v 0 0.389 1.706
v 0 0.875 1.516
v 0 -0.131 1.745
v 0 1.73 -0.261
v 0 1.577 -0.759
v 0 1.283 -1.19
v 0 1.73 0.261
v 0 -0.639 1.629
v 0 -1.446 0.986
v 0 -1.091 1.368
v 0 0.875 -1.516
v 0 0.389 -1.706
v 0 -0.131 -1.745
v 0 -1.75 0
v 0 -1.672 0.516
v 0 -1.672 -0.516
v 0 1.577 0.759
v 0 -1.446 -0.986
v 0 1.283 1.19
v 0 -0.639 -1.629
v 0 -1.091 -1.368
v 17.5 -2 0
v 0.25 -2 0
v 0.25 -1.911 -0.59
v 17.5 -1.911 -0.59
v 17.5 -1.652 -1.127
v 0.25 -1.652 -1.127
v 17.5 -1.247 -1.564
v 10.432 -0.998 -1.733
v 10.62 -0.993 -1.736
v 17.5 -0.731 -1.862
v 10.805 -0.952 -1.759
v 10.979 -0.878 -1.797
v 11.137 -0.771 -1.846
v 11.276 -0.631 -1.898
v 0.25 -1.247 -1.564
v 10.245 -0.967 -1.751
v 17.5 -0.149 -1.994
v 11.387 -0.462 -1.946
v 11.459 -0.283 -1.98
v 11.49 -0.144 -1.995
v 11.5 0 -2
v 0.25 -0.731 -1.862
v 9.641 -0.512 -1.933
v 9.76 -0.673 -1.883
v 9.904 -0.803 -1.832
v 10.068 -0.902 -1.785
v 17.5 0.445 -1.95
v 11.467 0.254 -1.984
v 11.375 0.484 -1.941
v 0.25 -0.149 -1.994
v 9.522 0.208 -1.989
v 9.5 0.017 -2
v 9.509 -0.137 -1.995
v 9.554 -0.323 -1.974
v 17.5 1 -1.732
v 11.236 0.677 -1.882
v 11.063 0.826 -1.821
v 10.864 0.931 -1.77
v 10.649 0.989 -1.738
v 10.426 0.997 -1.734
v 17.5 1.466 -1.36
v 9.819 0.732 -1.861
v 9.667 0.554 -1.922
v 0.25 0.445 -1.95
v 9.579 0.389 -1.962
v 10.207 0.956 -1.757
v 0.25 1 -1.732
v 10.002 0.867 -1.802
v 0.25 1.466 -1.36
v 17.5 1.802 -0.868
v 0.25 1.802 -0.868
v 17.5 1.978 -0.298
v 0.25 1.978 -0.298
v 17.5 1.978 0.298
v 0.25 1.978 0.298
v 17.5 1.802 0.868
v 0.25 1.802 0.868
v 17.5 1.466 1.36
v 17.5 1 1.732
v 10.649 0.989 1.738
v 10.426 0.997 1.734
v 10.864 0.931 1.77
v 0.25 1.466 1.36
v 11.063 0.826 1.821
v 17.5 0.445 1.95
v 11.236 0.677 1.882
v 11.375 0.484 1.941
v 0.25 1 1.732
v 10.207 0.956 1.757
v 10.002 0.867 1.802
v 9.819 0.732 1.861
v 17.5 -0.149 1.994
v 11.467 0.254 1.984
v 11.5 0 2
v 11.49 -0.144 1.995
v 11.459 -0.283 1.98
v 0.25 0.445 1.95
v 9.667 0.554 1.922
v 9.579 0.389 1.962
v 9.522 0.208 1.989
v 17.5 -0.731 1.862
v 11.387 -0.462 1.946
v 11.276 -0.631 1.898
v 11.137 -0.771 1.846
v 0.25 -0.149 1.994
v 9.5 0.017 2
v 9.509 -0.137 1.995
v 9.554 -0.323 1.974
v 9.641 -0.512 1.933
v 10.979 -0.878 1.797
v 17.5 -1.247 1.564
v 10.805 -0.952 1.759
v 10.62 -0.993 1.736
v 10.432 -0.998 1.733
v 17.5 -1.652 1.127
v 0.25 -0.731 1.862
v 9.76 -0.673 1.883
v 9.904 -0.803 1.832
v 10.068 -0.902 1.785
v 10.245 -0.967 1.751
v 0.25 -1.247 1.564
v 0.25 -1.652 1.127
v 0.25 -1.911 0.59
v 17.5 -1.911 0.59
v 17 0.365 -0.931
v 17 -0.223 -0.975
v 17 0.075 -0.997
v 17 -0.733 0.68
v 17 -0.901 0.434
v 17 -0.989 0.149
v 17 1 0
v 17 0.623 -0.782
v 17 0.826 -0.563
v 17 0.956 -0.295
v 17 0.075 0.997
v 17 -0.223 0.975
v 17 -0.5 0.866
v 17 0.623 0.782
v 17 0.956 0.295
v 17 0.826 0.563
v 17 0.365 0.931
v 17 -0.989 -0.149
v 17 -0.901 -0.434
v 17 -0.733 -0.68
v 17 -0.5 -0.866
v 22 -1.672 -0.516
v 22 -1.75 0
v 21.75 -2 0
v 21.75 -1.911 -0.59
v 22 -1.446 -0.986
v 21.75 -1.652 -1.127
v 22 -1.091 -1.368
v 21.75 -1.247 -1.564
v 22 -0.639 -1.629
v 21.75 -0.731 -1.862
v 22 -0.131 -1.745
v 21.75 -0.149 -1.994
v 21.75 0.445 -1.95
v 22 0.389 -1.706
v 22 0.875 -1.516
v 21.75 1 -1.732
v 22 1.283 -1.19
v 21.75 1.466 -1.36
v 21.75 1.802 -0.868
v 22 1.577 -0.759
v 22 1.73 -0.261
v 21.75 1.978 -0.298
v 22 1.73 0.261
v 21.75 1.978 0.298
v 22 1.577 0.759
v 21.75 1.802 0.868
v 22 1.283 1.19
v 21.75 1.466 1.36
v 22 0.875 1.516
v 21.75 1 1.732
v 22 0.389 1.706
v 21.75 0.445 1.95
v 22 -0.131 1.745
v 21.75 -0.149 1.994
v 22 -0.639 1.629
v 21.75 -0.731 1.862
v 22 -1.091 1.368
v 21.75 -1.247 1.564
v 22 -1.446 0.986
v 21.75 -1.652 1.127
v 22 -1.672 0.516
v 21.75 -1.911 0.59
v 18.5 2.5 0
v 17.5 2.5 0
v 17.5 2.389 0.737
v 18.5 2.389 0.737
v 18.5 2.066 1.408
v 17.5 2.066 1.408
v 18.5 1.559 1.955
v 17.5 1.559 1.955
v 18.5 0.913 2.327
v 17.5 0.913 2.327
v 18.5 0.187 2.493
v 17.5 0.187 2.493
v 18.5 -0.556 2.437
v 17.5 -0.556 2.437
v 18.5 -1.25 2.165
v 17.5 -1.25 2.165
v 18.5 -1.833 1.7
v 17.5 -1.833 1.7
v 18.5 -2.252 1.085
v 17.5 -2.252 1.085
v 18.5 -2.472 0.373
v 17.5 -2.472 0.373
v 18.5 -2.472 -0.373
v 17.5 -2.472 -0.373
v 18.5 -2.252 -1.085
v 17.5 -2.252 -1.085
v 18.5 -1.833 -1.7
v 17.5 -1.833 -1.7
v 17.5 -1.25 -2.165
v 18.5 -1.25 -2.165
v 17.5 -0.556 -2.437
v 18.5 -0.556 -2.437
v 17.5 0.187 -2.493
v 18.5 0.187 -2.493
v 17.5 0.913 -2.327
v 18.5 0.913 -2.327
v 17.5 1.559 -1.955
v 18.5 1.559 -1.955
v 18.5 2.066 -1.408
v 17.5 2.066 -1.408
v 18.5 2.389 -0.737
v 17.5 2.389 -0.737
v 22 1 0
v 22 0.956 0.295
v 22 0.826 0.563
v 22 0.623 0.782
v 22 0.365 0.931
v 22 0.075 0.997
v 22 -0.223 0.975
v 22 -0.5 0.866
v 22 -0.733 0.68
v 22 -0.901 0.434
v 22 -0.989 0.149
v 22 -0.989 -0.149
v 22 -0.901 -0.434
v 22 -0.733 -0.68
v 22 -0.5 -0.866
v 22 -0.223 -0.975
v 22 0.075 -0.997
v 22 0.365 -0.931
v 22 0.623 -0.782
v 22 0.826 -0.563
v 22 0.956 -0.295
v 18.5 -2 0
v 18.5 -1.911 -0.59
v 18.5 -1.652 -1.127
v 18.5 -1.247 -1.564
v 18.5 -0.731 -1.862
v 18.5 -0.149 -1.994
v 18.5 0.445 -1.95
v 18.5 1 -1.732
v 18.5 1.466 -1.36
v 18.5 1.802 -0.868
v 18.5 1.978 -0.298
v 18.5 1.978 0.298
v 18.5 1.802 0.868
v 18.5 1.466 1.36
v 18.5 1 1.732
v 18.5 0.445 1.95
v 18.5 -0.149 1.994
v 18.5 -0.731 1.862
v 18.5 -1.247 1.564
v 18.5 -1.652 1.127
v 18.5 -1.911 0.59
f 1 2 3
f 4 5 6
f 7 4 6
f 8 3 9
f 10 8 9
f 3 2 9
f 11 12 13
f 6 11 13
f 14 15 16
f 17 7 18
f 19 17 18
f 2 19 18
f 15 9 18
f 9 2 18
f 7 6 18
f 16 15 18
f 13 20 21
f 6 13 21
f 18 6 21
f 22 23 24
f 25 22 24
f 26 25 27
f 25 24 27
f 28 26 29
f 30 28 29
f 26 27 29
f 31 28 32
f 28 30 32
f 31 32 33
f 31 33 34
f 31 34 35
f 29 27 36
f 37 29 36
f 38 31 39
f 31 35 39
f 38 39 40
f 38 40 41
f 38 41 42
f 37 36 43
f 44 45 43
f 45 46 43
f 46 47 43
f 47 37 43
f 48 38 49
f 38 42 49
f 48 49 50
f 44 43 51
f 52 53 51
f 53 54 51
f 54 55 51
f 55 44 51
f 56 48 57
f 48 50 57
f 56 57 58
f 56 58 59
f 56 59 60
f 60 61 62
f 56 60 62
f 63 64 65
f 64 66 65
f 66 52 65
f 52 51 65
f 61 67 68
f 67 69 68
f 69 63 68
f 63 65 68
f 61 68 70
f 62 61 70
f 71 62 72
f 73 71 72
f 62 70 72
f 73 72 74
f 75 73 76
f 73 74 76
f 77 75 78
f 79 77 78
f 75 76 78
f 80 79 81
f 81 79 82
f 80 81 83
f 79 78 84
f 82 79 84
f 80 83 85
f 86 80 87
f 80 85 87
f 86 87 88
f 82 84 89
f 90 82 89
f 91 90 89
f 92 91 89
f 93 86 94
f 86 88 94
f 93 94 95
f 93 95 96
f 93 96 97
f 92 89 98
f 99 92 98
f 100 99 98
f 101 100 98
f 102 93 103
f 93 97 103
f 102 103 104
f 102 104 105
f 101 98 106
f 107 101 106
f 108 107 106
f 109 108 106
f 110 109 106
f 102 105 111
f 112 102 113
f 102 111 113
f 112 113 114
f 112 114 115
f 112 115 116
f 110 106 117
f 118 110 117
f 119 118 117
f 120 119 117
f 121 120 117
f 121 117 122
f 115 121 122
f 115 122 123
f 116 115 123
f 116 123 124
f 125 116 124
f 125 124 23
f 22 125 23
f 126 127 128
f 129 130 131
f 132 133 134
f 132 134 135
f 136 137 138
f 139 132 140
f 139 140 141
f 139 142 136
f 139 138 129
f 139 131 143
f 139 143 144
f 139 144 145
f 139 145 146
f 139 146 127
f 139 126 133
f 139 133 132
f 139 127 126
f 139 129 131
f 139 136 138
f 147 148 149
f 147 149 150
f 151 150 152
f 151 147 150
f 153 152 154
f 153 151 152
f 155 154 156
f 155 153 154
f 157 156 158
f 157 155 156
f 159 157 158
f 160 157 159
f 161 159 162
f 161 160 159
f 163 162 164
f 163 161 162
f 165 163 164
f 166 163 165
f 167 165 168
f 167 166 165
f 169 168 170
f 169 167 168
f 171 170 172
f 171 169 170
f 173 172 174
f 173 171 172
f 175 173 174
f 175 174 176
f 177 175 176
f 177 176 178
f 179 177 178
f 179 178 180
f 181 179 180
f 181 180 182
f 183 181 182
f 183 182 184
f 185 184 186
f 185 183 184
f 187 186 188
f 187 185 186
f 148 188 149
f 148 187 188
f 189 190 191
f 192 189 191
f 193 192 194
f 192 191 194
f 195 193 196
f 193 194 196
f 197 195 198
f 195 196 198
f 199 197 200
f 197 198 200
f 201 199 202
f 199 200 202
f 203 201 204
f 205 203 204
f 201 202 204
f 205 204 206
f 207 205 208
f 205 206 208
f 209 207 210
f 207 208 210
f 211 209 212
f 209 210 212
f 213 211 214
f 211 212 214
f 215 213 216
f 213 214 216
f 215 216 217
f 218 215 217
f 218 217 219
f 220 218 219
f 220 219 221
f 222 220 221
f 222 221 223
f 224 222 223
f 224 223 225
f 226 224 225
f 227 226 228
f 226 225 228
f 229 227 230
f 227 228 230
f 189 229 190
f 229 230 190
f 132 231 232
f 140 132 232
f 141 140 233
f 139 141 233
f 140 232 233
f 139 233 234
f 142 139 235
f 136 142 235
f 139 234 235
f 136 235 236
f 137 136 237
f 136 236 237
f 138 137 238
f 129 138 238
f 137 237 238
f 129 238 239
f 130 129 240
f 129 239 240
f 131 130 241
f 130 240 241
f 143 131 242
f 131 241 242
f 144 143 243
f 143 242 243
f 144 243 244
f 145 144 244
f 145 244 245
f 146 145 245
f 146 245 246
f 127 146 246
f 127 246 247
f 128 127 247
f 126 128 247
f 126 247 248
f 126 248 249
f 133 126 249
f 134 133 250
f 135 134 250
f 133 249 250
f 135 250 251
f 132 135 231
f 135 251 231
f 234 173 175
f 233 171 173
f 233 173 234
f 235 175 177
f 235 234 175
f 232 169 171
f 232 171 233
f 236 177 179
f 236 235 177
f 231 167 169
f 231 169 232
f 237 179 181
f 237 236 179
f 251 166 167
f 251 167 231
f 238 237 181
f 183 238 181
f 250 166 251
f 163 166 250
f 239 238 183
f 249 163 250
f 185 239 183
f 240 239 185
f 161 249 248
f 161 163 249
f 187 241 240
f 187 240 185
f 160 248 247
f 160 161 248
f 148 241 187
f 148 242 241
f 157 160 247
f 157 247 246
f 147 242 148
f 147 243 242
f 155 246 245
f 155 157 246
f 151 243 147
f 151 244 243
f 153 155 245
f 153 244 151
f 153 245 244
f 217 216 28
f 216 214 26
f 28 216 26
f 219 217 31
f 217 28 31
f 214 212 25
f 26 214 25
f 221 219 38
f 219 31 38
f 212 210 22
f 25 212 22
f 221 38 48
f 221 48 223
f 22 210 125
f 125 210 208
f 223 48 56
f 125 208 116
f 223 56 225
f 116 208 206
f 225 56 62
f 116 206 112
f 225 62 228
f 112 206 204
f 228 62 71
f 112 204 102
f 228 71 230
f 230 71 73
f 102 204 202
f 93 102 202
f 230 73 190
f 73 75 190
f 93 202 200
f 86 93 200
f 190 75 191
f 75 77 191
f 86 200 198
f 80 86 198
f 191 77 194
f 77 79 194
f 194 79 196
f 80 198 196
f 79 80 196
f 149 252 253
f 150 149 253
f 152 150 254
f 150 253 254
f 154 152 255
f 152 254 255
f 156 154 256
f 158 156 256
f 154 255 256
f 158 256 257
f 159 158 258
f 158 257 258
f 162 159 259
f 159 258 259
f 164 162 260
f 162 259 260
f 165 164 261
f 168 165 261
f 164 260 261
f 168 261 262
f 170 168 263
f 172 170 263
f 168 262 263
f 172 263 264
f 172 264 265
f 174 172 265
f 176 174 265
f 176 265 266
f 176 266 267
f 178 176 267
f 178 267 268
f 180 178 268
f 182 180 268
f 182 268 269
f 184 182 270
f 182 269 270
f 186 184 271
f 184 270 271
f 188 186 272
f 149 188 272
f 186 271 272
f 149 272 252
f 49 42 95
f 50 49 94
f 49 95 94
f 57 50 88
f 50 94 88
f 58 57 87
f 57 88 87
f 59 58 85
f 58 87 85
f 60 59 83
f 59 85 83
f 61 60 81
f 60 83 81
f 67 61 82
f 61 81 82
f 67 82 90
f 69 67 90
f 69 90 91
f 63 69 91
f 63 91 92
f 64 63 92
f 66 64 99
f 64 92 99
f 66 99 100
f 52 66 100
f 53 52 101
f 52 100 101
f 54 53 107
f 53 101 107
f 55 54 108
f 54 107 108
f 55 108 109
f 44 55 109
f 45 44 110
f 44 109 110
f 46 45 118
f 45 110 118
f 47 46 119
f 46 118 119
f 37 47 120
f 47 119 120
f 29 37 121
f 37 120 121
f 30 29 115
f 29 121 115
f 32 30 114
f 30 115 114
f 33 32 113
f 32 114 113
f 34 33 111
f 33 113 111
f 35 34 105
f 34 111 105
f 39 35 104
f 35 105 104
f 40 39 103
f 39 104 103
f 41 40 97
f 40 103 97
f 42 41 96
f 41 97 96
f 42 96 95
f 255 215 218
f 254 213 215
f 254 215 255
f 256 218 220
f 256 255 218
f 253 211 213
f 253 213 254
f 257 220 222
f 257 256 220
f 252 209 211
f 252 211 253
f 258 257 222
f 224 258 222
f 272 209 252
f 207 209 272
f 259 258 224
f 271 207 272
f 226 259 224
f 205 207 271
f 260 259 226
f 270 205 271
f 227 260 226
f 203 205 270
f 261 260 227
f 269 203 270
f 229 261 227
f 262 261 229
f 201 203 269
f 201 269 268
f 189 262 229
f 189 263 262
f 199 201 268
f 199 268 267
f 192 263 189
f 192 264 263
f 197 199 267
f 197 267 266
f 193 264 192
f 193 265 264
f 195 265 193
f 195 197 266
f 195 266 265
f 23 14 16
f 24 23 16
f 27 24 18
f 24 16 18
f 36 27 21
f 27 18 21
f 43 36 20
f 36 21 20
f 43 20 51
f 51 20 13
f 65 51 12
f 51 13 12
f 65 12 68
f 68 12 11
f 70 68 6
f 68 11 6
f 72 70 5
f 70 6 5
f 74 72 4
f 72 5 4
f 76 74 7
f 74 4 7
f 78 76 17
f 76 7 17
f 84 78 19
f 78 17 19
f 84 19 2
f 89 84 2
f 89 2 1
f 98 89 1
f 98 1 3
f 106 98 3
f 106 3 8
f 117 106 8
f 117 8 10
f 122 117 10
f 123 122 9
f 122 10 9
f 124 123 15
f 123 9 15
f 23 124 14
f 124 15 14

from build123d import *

# Parameters (mm, degrees)
CUT_EXTRUDE_START   = -3.5
CUT_EXTRUDE_1_DEPTH = 10
SKETCH_3_W          = 4
SKETCH_3_H          = 19.670556204
CUT_EXTRUDE_2_DEPTH = 10
CUT_EXTRUDE_START_2 = -29
SKETCH_4_R          = 4
SKETCH_4_R_2        = 2
CUT_EXTRUDE_3_DEPTH = 29
SKETCH_5_R          = 1
CUT_EXTRUDE_4_DEPTH = 5
SKETCH_6_R          = 2
EXTRUDE_1_DEPTH     = 1
EXTRUDE_START       = -4.5
SKETCH_7_R          = 2.5
SKETCH_7_R_2        = 2
EXTRUDE_2_DEPTH     = 1
SKETCH_8_R          = 1
CUT_EXTRUDE_5_DEPTH = 5
CHAMFER_1_SIZE      = 0.25
CHAMFER_2_SIZE      = 0.25


with BuildPart() as part:
    # 草图1 → 旋转2 (revolve)
    with BuildSketch(Plane.XY, mode=Mode.PRIVATE) as revolve_2_sk:
        Polygon((0, 2), (0, 0), (17, 0), (21, 0), (21, 2), (17, 2), (17, 4), (4, 4), (4, 2), align=None)
    revolve(revolve_2_sk.sketch.rotate(Axis((-16.701754386, 0, 0), (1, 0, 0)), 180), axis=Axis((-16.701754386, 0, 0), (1, 0, 0)))

    # 草图2 → 切除-拉伸1 (cut)
    with BuildSketch(Plane.XY.offset(CUT_EXTRUDE_START)):
        Polygon((12.5, -5.827233832), (12.5, 4), (10.5, 4), (8.5, 4), (8.5, -5.827233832), align=None)
    extrude(amount=-CUT_EXTRUDE_1_DEPTH, mode=Mode.SUBTRACT)

    # 草图3 → 切除-拉伸2 (cut)
    with BuildSketch(Plane(origin=(0, 0, 0), x_dir=(1, 0, 0), z_dir=(0, 1, 0)).offset(CUT_EXTRUDE_START)):
        with Locations((10.5, 3.5)):
            Rectangle(SKETCH_3_W, SKETCH_3_H)
    extrude(amount=-CUT_EXTRUDE_2_DEPTH, mode=Mode.SUBTRACT)

    # 草图4 → 切除-拉伸3 (cut)
    with BuildSketch(Plane(origin=(21, 0, 0), x_dir=(0, 0, -1), z_dir=(1, 0, 0)).offset(CUT_EXTRUDE_START_2)):
        Circle(SKETCH_4_R)
        with Locations(Location((0, 0, 0), (0, 0, 270))):
            Circle(SKETCH_4_R_2, mode=Mode.SUBTRACT)
    extrude(amount=CUT_EXTRUDE_3_DEPTH, mode=Mode.SUBTRACT)

    # 草图5 → 切除-拉伸4 (cut, symmetric)
    with BuildSketch(Plane.XY):
        with Locations((10.5, 0)):
            Circle(SKETCH_5_R)
    extrude(amount=CUT_EXTRUDE_4_DEPTH, both=True, mode=Mode.SUBTRACT)

    # 草图6 → 凸台-拉伸1 (add)
    with BuildSketch(Plane(origin=(21, 0, 0), x_dir=(0, 0, -1), z_dir=(1, 0, 0))):
        with Locations(Location((0, 0, 0), (0, 0, 270))):
            Circle(SKETCH_6_R)
    extrude(amount=EXTRUDE_1_DEPTH)

    # 草图7 → 凸台-拉伸2 (add)
    with BuildSketch(Plane(origin=(22, 0, 0), x_dir=(0, 0, -1), z_dir=(1, 0, 0)).offset(EXTRUDE_START)):
        with Locations(Location((0, 0, 0), (0, 0, 90))):
            Circle(SKETCH_7_R)
        with Locations(Location((0, 0, 0), (0, 0, 270))):
            Circle(SKETCH_7_R_2, mode=Mode.SUBTRACT)
    extrude(amount=EXTRUDE_2_DEPTH)

    # 草图8 → 切除-拉伸5 (cut)
    with BuildSketch(Plane(origin=(22, 0, 0), x_dir=(0, 0, -1), z_dir=(1, 0, 0))):
        with Locations(Location((0, 0, 0), (0, 0, 90))):
            Circle(SKETCH_8_R)
    extrude(amount=-CUT_EXTRUDE_5_DEPTH, mode=Mode.SUBTRACT)

    # 倒角1
    chamfer_1_edges = [part.edges().sort_by_distance(p)[0] for p in [
        (22, 2, 0),
    ]]
    chamfer(chamfer_1_edges, length=CHAMFER_1_SIZE)

    # 倒角2
    chamfer_2_edges = [part.edges().sort_by_distance(p)[0] for p in [
        (0, 2, 0),
    ]]
    chamfer(chamfer_2_edges, length=CHAMFER_2_SIZE)


solid = part.part
